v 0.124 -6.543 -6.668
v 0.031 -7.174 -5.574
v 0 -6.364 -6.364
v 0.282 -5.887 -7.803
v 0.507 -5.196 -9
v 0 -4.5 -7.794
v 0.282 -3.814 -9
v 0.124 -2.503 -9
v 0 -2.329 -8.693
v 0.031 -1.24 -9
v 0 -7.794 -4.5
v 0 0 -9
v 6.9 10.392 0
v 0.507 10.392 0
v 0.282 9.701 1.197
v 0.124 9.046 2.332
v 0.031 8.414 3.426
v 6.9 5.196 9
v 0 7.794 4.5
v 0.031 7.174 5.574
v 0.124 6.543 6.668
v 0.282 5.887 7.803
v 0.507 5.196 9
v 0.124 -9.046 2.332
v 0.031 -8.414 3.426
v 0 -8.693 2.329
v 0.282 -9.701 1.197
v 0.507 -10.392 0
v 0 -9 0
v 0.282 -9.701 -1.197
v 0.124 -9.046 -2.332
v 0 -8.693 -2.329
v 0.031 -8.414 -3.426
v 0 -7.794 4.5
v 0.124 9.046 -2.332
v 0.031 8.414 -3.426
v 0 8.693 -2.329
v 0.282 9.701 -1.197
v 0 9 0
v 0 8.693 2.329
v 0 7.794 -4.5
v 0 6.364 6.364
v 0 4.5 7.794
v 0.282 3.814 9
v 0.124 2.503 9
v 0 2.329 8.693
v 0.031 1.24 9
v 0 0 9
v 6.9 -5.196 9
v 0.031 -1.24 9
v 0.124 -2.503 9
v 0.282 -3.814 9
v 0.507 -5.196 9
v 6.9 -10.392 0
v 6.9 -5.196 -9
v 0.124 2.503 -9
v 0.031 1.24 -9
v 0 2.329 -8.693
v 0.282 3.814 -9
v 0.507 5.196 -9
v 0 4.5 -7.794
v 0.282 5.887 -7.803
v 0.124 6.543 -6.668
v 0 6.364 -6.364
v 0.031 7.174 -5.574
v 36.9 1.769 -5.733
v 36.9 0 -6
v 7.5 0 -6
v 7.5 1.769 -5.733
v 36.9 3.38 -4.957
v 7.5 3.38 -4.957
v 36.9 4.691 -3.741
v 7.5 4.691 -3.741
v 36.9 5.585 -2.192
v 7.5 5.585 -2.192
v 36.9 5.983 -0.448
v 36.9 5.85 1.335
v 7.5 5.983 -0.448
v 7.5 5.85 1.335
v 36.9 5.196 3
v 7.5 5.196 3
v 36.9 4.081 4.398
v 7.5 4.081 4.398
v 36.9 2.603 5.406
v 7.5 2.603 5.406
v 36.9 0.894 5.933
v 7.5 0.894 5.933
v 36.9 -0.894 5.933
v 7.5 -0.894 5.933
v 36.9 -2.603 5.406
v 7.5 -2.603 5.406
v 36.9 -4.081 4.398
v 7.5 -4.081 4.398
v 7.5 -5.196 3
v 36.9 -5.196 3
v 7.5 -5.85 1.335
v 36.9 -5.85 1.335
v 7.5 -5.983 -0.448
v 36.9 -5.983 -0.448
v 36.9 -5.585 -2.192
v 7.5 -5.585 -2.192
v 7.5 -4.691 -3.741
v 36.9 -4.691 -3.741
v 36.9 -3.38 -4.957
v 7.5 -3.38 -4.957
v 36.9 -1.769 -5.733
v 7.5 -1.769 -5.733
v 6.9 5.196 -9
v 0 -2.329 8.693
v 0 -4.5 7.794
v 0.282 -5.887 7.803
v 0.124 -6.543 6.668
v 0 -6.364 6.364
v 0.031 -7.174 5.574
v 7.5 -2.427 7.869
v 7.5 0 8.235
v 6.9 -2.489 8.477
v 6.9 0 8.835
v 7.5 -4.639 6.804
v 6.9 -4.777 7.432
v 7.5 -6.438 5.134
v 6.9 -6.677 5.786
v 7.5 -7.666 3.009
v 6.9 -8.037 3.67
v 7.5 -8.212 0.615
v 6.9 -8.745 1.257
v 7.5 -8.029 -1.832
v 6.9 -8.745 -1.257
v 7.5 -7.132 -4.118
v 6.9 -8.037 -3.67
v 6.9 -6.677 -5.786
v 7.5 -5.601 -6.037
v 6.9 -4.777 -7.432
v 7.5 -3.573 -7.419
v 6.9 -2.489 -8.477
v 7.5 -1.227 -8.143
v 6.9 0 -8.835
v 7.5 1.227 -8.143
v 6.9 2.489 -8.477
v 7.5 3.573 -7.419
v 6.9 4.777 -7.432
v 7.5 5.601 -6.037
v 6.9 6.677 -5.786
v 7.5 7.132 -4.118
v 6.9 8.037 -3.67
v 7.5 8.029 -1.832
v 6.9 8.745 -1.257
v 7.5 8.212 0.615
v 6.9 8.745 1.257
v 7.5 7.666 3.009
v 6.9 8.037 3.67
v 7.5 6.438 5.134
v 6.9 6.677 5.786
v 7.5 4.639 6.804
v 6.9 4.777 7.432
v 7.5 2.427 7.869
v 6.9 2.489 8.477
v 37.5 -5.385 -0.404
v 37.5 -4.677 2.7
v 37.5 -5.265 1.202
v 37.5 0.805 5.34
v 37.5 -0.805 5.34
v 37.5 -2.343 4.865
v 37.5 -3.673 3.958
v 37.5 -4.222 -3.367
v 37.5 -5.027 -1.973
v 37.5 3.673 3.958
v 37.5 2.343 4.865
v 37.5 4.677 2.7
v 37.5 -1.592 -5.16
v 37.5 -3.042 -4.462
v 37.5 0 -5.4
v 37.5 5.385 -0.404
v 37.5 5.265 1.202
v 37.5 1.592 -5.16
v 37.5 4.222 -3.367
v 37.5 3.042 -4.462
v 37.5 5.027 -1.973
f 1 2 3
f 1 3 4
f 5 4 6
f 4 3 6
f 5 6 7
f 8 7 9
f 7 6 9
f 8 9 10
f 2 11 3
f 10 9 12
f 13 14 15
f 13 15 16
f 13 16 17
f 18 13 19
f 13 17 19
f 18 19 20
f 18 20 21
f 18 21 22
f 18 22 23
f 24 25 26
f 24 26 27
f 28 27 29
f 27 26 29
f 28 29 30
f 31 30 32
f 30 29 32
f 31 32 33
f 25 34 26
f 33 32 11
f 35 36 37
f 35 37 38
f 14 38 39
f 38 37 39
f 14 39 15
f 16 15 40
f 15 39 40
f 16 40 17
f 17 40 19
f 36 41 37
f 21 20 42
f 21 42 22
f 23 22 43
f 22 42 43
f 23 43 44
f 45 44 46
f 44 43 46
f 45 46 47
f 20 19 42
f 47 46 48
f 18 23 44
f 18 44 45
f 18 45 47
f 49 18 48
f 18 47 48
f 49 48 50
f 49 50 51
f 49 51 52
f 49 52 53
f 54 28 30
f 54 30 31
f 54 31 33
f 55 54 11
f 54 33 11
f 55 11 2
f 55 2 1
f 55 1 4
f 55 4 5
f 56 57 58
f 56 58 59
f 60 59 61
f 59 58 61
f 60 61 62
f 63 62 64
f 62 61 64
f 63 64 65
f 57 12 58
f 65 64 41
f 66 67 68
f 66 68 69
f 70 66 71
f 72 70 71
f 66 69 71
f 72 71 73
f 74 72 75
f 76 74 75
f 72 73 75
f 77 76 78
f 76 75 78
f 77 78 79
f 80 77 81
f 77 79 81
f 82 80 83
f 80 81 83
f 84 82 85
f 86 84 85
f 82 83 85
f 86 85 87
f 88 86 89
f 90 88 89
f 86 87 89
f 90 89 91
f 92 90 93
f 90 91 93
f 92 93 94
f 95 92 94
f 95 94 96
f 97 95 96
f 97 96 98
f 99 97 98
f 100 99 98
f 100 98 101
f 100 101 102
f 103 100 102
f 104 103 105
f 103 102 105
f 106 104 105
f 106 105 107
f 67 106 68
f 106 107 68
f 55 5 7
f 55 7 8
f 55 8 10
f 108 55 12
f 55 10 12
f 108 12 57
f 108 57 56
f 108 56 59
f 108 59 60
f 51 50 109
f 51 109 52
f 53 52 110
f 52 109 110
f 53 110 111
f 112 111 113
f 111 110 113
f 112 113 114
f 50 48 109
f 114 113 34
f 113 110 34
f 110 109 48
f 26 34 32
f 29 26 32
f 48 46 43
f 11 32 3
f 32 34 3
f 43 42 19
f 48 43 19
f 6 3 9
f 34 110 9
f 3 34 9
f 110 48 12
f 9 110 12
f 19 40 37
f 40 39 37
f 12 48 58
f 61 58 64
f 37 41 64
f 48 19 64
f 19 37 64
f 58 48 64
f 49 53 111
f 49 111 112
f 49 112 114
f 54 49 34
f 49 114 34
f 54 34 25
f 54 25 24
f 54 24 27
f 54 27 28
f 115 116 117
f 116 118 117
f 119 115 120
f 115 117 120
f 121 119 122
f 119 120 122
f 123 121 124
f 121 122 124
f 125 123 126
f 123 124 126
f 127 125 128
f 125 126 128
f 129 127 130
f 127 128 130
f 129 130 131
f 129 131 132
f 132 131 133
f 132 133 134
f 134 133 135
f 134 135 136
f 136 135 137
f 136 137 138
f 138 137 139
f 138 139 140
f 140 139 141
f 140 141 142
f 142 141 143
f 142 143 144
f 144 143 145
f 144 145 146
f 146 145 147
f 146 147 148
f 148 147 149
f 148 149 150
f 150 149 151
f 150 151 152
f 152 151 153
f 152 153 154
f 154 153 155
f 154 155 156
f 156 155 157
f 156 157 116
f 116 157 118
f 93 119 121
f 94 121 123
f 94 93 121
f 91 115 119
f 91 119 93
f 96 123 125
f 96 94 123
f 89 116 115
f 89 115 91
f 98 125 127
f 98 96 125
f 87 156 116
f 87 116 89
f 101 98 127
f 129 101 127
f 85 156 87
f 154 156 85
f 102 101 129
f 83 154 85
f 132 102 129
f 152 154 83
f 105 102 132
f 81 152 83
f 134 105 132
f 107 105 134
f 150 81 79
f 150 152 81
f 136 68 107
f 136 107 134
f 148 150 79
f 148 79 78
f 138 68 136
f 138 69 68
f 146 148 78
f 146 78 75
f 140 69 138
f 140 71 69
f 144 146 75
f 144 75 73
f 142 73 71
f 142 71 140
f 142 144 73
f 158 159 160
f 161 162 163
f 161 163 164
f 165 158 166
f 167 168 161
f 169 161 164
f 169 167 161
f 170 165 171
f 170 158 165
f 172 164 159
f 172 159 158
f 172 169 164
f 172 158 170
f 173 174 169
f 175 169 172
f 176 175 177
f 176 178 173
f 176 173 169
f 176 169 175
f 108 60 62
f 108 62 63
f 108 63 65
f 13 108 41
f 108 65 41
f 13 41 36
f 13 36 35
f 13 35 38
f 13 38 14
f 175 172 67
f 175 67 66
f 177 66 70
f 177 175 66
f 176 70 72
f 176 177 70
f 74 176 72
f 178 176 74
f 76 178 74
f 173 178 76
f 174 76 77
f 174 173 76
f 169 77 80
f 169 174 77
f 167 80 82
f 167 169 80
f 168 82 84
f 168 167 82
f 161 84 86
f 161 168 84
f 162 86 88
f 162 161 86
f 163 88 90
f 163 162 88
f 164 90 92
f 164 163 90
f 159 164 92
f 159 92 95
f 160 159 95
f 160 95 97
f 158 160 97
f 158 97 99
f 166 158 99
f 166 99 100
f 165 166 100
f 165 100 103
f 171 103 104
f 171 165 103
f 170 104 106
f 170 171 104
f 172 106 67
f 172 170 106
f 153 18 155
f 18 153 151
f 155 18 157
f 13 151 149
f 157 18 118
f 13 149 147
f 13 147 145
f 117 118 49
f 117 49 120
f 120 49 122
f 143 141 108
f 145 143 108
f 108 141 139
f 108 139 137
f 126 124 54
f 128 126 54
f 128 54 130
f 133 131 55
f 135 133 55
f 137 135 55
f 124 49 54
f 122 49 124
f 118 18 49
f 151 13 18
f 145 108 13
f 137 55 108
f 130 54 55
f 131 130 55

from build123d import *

# Parameters (mm, degrees)
BASEHEAD_DEPTH = 7.5
SKETCH5_R      = 6
BASEBODY_DEPTH = 30
CHAMFER1_SIZE  = 0.6


with BuildPart() as part:
    # Sketch2 → BaseHead (new body)
    with BuildSketch(Plane(origin=(0, 0, 0), x_dir=(0, 0, -1), z_dir=(1, 0, 0))):
        Polygon((0, -10.392304845), (9, -5.196152423), (9, 5.196152423), (0, 10.392304845), (-9, 5.196152423), (-9, -5.196152423), align=None)
    extrude(amount=BASEHEAD_DEPTH)

    # Sketch3 → BearingFace (revolve, cut)
    with BuildSketch(Plane.XY, mode=Mode.PRIVATE) as bearingface_sk:
        Polygon((7.5, 10.392304845), (7.5, 8.235), (6.9, 8.835), (6.9, 10.392304845), align=None)
    revolve(bearingface_sk.sketch.rotate(Axis((-0.957090588, 0, 0), (1, 0, 0)), 90), axis=Axis((-0.957090588, 0, 0), (1, 0, 0)), mode=Mode.SUBTRACT)

    # Sketch4 → HeadChamfer (revolve, cut)
    with BuildSketch(Plane.XY):
        Polygon((0, 10.392304845), (0.506757521, 10.392304845), (0, 9), align=None)
    revolve(axis=Axis((-0.493528746, 0, 0), (1, 0, 0)), mode=Mode.SUBTRACT)

    # Sketch5 → BaseBody (add)
    with BuildSketch(Plane(origin=(7.5, 0, 0), x_dir=(0, 0, -1), z_dir=(1, 0, 0))):
        Circle(SKETCH5_R)
    extrude(amount=BASEBODY_DEPTH)

    # Chamfer1
    chamfer1_edges = [part.edges().sort_by_distance(p)[0] for p in [
        (37.5, 0, 6),
    ]]
    chamfer(chamfer1_edges, length=CHAMFER1_SIZE)


solid = part.part
